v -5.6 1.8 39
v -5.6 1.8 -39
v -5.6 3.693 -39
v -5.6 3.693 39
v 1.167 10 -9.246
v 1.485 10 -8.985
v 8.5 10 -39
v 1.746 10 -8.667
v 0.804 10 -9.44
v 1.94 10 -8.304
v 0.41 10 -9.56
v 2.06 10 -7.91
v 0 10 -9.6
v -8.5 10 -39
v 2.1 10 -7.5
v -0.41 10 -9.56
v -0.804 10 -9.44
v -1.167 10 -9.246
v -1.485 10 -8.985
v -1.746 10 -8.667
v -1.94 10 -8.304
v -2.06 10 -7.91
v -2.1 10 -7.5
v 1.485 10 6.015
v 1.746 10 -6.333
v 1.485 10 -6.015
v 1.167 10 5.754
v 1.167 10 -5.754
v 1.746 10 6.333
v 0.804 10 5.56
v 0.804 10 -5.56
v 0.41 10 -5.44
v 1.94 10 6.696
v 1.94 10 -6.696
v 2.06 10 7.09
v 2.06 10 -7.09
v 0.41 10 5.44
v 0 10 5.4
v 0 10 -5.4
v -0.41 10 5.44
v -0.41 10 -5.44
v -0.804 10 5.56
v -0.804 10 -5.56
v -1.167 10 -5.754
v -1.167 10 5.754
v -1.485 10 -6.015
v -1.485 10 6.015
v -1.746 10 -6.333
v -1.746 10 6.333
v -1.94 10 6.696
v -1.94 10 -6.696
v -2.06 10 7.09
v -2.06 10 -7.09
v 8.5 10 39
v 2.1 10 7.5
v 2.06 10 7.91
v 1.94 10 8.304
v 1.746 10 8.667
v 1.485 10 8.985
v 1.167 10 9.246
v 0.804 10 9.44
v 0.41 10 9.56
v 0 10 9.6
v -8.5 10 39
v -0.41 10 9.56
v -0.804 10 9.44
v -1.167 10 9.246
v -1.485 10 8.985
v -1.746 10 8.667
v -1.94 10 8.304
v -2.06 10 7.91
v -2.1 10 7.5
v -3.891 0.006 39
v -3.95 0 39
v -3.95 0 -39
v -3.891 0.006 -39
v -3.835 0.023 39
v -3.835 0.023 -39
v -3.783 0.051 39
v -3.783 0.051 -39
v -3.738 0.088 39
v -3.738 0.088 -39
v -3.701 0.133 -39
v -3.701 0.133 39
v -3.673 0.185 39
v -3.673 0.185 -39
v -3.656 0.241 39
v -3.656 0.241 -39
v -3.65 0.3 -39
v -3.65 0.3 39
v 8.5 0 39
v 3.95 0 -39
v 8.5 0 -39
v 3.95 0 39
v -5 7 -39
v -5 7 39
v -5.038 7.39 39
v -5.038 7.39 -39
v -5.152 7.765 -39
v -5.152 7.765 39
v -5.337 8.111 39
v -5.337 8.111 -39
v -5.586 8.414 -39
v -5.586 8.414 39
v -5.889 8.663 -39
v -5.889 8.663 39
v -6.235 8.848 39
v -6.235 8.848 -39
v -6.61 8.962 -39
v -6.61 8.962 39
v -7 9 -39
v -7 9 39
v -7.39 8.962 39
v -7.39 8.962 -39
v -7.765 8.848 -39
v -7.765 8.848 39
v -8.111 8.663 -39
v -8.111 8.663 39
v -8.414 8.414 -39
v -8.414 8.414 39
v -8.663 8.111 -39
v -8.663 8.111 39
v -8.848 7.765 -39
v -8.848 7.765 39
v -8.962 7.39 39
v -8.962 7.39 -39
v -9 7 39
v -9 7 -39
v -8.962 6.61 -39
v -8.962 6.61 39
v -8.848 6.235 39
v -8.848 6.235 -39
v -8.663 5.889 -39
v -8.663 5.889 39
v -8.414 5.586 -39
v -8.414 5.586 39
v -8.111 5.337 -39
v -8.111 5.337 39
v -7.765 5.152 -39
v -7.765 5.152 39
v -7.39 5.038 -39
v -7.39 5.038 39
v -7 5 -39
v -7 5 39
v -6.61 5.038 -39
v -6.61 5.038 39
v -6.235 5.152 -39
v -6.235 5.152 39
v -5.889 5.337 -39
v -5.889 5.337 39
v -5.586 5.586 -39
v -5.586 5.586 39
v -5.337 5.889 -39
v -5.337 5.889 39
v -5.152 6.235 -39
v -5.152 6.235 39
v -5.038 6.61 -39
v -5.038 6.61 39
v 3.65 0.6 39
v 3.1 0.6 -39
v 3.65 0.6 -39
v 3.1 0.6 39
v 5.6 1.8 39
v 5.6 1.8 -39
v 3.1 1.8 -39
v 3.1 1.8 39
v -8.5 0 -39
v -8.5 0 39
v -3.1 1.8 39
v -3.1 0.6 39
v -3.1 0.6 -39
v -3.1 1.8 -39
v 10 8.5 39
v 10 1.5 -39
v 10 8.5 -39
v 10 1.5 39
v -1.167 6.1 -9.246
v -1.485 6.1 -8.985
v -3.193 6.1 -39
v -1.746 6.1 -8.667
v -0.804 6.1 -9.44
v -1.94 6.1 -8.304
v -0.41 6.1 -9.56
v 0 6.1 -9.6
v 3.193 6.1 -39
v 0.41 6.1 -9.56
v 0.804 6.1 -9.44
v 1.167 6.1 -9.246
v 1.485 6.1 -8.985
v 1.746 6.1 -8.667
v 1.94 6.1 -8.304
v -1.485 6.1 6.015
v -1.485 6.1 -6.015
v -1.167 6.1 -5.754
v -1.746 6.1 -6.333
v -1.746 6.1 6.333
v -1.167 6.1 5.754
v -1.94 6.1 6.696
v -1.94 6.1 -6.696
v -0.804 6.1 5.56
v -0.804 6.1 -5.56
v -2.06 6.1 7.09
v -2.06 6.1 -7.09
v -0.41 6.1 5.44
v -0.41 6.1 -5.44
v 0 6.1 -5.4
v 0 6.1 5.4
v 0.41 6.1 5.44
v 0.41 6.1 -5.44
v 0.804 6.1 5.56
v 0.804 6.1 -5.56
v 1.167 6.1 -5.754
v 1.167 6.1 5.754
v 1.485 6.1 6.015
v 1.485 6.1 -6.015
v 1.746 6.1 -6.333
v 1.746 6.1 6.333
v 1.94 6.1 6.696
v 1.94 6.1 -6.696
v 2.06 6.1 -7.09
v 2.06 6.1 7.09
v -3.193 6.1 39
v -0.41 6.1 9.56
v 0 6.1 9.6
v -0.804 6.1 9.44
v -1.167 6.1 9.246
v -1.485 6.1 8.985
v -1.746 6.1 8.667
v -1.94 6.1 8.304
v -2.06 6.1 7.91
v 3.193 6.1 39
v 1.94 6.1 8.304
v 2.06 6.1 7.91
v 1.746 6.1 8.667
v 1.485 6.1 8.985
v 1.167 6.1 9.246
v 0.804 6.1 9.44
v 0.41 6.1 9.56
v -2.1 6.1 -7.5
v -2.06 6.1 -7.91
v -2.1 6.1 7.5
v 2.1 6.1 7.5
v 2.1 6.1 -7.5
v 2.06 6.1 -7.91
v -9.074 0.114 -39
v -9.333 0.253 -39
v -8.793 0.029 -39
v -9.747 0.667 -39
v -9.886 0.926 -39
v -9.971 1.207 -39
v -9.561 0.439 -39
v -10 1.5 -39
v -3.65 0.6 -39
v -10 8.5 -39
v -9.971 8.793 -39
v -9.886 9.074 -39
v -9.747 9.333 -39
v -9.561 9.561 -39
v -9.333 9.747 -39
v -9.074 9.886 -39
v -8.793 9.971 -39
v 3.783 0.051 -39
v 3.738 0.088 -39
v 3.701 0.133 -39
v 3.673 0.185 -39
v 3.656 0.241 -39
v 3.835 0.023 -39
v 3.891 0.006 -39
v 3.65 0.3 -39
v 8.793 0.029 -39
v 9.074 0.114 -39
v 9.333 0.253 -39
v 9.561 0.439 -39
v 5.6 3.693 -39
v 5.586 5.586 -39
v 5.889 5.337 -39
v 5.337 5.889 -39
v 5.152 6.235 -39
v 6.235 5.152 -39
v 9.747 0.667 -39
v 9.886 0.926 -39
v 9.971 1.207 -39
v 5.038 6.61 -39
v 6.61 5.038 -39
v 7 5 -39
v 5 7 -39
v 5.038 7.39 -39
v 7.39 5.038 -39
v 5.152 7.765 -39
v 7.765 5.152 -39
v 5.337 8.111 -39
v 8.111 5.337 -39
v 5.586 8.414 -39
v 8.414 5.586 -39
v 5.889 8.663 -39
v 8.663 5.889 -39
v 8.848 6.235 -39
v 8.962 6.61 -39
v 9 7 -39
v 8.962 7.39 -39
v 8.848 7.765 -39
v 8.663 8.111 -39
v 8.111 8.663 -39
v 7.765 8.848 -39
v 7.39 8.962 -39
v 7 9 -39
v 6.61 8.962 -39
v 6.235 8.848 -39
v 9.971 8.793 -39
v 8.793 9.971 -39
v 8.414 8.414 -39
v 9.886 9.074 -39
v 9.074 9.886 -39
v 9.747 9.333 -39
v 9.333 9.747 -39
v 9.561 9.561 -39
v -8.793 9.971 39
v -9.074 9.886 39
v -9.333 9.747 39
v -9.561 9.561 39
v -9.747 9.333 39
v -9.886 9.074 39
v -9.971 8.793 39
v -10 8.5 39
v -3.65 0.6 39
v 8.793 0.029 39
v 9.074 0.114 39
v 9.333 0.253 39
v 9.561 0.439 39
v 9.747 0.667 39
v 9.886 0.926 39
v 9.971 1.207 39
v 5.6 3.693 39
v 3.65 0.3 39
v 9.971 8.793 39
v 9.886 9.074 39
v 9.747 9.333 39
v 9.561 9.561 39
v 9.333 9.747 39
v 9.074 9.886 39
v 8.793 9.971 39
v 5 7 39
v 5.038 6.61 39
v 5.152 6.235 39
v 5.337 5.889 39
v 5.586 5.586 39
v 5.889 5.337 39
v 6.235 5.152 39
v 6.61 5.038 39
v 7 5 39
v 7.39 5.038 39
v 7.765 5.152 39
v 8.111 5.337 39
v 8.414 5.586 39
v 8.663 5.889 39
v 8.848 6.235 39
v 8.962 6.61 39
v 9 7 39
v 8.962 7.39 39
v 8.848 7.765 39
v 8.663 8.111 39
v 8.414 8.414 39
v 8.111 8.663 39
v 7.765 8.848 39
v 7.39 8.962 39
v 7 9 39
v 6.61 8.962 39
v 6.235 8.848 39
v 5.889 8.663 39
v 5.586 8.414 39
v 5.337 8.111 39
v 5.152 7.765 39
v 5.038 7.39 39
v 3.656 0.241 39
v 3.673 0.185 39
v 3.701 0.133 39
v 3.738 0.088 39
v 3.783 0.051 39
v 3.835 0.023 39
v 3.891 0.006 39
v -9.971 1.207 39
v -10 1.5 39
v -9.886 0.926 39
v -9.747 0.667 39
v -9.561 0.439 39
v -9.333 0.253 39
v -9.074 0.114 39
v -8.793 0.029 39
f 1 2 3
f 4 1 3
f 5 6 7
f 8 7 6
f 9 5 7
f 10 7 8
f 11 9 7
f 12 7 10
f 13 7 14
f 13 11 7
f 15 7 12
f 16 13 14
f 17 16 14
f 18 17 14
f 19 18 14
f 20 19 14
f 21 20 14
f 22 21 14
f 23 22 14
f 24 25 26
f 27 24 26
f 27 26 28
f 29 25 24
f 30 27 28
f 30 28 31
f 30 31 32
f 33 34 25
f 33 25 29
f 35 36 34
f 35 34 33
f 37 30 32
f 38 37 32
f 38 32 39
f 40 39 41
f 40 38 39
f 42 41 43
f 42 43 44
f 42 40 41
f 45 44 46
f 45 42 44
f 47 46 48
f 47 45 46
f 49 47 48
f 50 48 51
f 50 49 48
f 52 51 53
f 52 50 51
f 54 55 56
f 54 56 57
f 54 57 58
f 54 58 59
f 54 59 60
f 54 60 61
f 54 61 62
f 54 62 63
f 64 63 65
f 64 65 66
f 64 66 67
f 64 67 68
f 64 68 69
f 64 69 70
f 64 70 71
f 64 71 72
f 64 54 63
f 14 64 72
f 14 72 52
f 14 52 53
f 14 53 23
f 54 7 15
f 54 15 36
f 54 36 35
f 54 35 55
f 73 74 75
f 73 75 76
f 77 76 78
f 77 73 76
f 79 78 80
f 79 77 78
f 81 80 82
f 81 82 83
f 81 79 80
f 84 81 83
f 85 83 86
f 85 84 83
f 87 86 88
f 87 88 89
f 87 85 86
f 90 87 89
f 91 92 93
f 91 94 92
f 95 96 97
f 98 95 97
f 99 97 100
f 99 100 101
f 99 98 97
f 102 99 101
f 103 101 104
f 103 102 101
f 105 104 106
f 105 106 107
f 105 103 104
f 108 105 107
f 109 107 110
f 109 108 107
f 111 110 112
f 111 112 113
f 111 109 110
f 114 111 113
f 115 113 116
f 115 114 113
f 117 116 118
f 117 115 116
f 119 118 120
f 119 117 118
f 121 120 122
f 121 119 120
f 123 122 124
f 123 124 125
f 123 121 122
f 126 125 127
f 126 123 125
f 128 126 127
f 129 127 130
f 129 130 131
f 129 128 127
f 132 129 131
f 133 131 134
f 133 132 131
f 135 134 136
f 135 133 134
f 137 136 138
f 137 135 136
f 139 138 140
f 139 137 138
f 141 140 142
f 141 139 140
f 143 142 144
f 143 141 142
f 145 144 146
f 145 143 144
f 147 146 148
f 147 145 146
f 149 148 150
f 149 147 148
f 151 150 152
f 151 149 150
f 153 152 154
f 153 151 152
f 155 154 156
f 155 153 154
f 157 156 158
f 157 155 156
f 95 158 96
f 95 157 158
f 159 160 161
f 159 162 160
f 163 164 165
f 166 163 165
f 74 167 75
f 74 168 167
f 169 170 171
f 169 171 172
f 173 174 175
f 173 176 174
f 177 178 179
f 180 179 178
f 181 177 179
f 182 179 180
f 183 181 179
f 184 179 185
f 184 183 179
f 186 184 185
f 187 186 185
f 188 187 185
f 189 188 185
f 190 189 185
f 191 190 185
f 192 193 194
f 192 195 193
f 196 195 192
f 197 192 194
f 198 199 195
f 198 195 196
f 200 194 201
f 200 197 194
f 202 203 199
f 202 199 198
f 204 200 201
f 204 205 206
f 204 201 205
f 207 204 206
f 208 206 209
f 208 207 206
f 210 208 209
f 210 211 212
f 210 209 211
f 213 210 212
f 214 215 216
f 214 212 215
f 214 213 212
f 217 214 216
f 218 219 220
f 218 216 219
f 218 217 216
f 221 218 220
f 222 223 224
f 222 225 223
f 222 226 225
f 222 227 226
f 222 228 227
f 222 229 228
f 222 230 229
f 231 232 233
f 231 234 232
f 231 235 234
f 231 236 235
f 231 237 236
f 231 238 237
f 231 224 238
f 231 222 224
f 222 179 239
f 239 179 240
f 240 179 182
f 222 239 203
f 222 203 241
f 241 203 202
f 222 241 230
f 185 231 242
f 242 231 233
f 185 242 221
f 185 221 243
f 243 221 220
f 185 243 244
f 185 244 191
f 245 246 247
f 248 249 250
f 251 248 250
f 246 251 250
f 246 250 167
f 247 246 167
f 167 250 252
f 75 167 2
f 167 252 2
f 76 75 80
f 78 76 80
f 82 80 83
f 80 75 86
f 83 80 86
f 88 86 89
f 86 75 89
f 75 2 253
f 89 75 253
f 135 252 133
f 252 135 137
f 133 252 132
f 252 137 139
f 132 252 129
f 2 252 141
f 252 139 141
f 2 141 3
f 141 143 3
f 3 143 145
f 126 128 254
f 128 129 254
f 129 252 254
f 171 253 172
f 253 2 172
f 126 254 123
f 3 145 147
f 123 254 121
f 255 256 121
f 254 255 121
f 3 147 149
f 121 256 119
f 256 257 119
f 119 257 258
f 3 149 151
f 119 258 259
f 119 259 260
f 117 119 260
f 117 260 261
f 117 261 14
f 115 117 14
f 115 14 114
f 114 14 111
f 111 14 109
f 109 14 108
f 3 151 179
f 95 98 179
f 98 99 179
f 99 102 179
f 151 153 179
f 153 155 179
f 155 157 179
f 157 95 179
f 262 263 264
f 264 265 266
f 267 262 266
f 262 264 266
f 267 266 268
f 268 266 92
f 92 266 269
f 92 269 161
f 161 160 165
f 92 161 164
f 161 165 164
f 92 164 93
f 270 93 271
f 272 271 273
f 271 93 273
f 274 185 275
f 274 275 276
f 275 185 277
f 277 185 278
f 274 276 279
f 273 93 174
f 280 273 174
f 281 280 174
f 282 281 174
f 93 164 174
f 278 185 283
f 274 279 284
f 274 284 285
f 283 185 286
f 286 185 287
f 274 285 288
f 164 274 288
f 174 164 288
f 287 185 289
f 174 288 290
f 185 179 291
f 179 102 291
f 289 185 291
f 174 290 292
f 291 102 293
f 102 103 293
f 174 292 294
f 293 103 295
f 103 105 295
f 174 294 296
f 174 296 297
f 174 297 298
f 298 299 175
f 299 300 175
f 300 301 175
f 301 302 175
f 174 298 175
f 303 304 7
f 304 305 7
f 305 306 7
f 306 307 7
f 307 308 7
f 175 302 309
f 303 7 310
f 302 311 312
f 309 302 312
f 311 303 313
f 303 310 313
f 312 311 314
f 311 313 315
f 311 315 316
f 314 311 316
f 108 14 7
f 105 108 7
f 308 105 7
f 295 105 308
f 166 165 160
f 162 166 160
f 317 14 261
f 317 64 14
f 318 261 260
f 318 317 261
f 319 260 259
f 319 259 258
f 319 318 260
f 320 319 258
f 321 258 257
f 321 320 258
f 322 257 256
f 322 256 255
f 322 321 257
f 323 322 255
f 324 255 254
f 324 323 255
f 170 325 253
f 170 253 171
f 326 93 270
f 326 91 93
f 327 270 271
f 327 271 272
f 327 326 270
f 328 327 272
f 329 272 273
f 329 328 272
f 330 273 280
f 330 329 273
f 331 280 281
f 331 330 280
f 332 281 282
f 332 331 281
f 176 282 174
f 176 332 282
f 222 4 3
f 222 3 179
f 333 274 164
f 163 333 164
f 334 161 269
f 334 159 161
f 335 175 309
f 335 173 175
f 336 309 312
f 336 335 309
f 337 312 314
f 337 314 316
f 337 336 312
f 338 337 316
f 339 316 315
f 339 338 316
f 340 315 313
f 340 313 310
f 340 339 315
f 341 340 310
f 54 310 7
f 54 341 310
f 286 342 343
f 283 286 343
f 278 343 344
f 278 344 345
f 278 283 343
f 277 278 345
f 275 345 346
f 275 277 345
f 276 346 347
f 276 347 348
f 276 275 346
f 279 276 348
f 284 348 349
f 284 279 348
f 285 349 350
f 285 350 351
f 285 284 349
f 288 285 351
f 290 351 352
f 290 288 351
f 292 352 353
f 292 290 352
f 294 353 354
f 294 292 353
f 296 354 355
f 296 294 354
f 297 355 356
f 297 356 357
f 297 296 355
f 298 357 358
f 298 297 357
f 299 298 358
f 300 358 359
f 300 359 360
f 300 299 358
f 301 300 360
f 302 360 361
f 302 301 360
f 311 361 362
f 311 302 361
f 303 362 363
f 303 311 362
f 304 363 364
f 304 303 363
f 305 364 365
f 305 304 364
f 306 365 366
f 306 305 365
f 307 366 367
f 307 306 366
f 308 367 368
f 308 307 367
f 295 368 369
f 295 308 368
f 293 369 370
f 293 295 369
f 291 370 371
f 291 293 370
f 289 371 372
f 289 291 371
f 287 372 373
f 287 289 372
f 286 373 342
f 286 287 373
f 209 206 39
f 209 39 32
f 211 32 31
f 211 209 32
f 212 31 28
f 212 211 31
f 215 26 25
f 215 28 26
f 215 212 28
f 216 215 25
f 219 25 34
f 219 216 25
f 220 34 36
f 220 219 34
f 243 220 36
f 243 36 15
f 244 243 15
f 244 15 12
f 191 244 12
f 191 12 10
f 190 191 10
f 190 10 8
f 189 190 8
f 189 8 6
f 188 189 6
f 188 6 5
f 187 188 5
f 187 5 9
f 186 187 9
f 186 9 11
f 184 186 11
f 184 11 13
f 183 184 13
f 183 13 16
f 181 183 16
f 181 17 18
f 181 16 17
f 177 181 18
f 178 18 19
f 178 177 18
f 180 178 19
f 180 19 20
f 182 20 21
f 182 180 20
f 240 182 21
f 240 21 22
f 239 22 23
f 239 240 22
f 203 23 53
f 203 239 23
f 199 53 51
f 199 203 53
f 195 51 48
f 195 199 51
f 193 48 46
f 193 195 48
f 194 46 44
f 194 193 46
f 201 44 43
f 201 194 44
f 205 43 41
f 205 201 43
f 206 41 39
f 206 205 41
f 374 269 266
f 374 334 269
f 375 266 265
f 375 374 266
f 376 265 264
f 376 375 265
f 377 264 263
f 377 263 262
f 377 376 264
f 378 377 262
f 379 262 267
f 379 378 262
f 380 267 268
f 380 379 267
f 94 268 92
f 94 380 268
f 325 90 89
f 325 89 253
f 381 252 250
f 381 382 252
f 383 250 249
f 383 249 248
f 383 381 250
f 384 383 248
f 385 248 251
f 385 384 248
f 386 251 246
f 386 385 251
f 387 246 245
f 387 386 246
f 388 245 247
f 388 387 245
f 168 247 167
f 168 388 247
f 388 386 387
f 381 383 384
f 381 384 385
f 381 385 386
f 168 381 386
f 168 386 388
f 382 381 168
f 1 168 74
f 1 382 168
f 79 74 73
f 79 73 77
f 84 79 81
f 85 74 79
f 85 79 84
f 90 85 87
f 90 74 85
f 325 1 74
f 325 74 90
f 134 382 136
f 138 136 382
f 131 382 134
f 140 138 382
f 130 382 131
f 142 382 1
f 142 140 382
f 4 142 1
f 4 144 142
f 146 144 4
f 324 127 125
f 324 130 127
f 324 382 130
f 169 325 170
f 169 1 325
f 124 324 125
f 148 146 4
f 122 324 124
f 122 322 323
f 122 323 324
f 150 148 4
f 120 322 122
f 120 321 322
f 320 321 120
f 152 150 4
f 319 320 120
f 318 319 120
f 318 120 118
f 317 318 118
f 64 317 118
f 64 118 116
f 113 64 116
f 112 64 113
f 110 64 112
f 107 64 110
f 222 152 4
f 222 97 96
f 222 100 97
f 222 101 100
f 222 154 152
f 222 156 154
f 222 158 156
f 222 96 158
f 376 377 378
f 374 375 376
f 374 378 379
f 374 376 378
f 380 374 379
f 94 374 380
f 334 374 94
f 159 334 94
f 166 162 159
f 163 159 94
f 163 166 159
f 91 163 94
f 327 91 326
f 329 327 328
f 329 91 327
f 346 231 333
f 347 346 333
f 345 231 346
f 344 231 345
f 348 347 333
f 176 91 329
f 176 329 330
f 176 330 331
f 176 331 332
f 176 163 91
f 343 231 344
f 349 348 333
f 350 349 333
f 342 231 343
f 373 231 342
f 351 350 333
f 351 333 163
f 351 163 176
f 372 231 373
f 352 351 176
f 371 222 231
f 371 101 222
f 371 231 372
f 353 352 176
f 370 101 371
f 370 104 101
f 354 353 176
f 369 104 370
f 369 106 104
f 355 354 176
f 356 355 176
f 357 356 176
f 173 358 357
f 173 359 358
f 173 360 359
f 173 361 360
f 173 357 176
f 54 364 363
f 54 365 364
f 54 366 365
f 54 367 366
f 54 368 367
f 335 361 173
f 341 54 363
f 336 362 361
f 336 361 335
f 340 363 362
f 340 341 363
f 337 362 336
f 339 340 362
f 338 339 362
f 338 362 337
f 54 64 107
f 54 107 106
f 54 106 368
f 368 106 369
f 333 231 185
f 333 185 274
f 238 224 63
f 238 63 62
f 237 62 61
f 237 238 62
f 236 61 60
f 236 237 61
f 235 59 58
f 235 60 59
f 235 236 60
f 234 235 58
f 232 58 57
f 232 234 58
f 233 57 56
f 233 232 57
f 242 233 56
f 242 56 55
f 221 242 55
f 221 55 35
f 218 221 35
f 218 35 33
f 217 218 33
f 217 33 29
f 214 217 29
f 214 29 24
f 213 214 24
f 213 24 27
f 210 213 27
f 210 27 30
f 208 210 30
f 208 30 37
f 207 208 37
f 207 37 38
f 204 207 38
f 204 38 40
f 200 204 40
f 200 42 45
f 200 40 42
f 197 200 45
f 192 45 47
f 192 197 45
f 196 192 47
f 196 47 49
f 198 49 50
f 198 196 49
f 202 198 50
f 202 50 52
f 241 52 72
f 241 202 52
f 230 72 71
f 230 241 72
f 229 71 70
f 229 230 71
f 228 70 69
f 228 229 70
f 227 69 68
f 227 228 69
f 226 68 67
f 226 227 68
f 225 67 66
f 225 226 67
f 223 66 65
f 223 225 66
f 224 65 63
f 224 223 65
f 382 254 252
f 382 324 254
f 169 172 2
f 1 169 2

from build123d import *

# Parameters (mm, degrees)
SKETCH_1_R               = 2
EXTRUDE_1_DEPTH          = 39
CUT_EXTRUDE_1_DEPTH      = 42.484937025
CUT_EXTRUDE_1_DEPTH_BACK = 42.484937025
SKETCH_2_R               = 2.1


with BuildPart() as part:
    # 草图1 → 凸台-拉伸1 (new, symmetric)
    with BuildSketch(Plane.XY):
        with BuildLine():
            Line((-8.5, 0), (-3.95, 0))
            ThreePointArc((-3.95, 0), (-3.737867966, 0.087867966), (-3.65, 0.3))
            Line((-3.65, 0.3), (-3.65, 0.6))
            Line((-3.65, 0.6), (-3.1, 0.6))
            Line((-3.1, 0.6), (-3.1, 1.8))
            Line((-3.1, 1.8), (-5.6, 1.8))
            Line((-5.6, 1.8), (-5.6, 3.692893219))
            Line((-5.6, 3.692893219), (-3.192893219, 6.1))
            Line((-3.192893219, 6.1), (3.192893219, 6.1))
            Line((3.192893219, 6.1), (5.6, 3.692893219))
            Line((5.6, 3.692893219), (5.6, 1.8))
            Line((5.6, 1.8), (3.1, 1.8))
            Line((3.1, 1.8), (3.1, 0.6))
            Line((3.1, 0.6), (3.65, 0.6))
            Line((3.65, 0.6), (3.65, 0.3))
            ThreePointArc((3.65, 0.3), (3.737867966, 0.087867966), (3.95, 0))
            Line((3.95, 0), (8.5, 0))
            ThreePointArc((8.5, 0), (9.560660172, 0.439339828), (10, 1.5))
            Line((10, 1.5), (10, 8.5))
            ThreePointArc((10, 8.5), (9.560660172, 9.560660172), (8.5, 10))
            Line((8.5, 10), (-8.5, 10))
            ThreePointArc((-8.5, 10), (-9.560660172, 9.560660172), (-10, 8.5))
            Line((-10, 8.5), (-10, 1.5))
            ThreePointArc((-10, 1.5), (-9.560660172, 0.439339828), (-8.5, 0))
        make_face()
        with Locations((-7, 7)):
            Circle(SKETCH_1_R, mode=Mode.SUBTRACT)
        with Locations(Location((7, 7, 0), (0, 0, 180))):
            Circle(SKETCH_1_R, mode=Mode.SUBTRACT)
    extrude(amount=EXTRUDE_1_DEPTH, both=True)

    # 草图2 → 切除-拉伸1 (cut, two sides: drawn at the far end of the back side and taken through both)
    with BuildSketch(Plane(origin=(0, 10, 0), x_dir=(1, 0, 0), z_dir=(0, 1, 0)).offset(-CUT_EXTRUDE_1_DEPTH_BACK)):
        with Locations(Location((0, 7.5, 0), (0, 0, 270))):
            Circle(SKETCH_2_R)
        with Locations(Location((0, -7.5, 0), (0, 0, 270))):
            Circle(SKETCH_2_R)
    extrude(amount=CUT_EXTRUDE_1_DEPTH + CUT_EXTRUDE_1_DEPTH_BACK, mode=Mode.SUBTRACT)


solid = part.part
